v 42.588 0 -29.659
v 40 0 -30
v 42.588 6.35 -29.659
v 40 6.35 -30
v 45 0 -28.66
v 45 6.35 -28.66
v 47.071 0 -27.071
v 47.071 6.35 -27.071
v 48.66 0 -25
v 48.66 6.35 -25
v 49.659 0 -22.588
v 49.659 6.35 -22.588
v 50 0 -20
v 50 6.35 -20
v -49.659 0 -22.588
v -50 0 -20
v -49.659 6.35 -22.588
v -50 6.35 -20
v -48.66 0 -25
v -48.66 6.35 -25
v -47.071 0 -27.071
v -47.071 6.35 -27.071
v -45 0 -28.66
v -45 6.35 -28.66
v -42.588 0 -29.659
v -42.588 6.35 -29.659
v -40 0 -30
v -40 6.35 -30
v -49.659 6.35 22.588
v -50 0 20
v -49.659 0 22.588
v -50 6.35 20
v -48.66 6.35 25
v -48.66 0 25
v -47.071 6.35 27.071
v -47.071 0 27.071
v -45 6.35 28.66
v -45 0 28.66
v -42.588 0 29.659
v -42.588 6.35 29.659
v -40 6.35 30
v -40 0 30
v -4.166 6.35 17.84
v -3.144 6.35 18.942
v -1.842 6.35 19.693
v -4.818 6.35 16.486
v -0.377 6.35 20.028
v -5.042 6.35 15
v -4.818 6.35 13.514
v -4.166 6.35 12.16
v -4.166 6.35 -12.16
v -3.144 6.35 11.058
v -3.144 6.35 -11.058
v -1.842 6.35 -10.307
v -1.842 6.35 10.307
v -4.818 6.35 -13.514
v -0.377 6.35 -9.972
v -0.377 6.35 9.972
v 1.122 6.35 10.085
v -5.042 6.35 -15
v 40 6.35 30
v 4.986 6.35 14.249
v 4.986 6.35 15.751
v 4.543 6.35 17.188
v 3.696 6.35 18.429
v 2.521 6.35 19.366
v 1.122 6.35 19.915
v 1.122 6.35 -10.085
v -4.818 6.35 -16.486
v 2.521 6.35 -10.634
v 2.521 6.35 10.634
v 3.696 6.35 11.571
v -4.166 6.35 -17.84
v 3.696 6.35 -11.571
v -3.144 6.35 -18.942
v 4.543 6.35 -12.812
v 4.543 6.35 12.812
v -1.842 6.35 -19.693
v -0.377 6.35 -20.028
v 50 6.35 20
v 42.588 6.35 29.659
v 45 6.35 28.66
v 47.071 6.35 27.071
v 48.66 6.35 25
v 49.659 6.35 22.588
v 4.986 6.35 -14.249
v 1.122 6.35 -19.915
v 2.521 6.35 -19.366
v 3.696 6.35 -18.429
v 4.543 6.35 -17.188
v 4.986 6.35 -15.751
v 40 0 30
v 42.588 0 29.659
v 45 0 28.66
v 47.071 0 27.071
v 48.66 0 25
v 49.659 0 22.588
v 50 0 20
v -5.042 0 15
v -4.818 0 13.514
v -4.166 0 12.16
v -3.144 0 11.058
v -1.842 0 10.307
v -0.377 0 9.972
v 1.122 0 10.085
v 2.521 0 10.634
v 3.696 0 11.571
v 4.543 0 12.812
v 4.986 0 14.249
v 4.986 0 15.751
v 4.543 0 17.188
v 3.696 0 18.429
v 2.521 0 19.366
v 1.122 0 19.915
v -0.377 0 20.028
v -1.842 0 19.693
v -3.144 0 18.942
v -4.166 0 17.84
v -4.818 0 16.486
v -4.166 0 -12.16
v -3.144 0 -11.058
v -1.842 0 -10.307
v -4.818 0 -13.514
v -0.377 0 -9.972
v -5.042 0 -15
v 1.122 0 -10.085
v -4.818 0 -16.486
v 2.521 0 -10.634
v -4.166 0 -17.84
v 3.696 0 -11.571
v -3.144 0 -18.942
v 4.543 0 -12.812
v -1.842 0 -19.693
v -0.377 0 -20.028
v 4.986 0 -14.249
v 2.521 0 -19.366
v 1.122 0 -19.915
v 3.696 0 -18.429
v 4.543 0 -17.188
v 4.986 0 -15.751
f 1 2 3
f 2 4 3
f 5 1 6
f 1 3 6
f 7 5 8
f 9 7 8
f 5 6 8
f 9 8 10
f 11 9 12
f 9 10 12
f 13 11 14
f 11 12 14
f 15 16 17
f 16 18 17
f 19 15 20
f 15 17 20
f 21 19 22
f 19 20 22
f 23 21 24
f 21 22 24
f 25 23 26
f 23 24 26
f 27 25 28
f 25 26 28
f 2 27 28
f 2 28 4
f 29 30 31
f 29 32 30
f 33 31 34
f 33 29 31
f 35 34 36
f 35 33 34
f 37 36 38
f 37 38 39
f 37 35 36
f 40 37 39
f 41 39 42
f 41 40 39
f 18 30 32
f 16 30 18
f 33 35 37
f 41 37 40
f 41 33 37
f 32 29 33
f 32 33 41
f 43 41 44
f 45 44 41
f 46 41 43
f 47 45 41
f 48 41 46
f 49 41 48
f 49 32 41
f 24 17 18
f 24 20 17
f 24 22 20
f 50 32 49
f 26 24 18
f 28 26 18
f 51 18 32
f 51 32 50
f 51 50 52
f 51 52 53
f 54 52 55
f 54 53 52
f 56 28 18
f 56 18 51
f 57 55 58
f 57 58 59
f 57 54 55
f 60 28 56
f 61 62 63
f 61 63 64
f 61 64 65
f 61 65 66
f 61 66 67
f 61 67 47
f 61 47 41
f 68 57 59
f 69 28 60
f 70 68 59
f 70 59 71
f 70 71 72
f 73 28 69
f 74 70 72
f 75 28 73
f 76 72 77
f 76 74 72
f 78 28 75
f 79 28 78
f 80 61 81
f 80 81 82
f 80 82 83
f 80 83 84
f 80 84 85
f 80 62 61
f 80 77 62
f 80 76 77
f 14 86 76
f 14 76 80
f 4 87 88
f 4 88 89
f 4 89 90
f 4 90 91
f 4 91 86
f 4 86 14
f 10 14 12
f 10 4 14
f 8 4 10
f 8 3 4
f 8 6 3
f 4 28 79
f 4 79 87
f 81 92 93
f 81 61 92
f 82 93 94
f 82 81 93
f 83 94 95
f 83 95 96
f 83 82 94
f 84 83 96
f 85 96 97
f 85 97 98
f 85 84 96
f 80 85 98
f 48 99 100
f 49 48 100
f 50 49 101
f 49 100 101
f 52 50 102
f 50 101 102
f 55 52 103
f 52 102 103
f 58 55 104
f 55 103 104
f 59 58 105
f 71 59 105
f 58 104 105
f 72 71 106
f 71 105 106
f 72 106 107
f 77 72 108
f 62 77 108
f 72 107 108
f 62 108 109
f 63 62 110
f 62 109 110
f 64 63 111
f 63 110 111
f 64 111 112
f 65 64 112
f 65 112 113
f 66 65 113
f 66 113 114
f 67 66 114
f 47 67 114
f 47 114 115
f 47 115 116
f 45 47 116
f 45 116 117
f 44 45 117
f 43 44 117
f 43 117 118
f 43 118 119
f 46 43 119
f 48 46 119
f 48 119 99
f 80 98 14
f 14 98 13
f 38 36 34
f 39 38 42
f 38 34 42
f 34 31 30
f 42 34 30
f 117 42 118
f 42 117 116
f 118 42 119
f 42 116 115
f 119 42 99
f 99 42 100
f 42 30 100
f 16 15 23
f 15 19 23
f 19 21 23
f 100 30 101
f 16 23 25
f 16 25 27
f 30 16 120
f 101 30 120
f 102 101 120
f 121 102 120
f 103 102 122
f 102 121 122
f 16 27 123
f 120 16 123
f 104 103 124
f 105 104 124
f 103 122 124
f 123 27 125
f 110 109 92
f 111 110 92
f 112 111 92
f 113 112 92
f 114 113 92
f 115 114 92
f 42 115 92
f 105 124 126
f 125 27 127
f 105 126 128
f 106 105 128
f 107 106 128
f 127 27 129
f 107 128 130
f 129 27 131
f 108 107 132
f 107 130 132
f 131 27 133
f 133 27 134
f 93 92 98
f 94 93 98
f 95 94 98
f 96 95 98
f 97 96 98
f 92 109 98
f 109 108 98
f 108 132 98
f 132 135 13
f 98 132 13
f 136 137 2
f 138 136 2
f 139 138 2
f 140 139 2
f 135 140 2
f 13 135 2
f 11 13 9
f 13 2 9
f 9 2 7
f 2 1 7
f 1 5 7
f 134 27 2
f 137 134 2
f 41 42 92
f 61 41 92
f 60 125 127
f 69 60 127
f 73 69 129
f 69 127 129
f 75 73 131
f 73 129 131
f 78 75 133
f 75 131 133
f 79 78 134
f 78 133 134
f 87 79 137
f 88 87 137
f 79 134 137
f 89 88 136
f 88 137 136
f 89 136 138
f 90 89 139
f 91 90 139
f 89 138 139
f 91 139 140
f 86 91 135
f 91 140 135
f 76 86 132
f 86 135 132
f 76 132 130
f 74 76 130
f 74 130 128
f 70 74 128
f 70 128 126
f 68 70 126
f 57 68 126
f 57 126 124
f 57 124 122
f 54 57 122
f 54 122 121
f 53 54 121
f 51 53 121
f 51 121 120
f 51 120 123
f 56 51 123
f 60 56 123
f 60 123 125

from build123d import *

# Parameters (mm, degrees)
SKETCH1_W               = 100
SKETCH1_H               = 60
BOSS_EXTRUDE1_DEPTH     = 6.35
F_3_8_CLEARANCE_HOLE1_D = 10.0838
FILLET1_R               = 10


with BuildPart() as part:
    # Sketch1 → Boss-Extrude1 (new body)
    with BuildSketch(Plane(origin=(0, 0, 0), x_dir=(1, 0, 0), z_dir=(0, 1, 0))):
        Rectangle(SKETCH1_W, SKETCH1_H)
    extrude(amount=BOSS_EXTRUDE1_DEPTH)

    # 3/8 Clearance Hole1 (through all)
    with Locations(Plane(origin=(0, 6.35, 0), x_dir=(1, 0, 0), z_dir=(0, 1, 0))):
        with Locations((0, 15), (0, -15)):
            Hole(F_3_8_CLEARANCE_HOLE1_D / 2)

    # Fillet1
    fillet1_edges = [part.edges().sort_by_distance(p)[0] for p in [
        (-50, 3.175, 30),
        (-50, 3.175, -30),
        (50, 3.175, -30),
        (50, 3.175, 30),
    ]]
    fillet(fillet1_edges, radius=FILLET1_R)


solid = part.part
